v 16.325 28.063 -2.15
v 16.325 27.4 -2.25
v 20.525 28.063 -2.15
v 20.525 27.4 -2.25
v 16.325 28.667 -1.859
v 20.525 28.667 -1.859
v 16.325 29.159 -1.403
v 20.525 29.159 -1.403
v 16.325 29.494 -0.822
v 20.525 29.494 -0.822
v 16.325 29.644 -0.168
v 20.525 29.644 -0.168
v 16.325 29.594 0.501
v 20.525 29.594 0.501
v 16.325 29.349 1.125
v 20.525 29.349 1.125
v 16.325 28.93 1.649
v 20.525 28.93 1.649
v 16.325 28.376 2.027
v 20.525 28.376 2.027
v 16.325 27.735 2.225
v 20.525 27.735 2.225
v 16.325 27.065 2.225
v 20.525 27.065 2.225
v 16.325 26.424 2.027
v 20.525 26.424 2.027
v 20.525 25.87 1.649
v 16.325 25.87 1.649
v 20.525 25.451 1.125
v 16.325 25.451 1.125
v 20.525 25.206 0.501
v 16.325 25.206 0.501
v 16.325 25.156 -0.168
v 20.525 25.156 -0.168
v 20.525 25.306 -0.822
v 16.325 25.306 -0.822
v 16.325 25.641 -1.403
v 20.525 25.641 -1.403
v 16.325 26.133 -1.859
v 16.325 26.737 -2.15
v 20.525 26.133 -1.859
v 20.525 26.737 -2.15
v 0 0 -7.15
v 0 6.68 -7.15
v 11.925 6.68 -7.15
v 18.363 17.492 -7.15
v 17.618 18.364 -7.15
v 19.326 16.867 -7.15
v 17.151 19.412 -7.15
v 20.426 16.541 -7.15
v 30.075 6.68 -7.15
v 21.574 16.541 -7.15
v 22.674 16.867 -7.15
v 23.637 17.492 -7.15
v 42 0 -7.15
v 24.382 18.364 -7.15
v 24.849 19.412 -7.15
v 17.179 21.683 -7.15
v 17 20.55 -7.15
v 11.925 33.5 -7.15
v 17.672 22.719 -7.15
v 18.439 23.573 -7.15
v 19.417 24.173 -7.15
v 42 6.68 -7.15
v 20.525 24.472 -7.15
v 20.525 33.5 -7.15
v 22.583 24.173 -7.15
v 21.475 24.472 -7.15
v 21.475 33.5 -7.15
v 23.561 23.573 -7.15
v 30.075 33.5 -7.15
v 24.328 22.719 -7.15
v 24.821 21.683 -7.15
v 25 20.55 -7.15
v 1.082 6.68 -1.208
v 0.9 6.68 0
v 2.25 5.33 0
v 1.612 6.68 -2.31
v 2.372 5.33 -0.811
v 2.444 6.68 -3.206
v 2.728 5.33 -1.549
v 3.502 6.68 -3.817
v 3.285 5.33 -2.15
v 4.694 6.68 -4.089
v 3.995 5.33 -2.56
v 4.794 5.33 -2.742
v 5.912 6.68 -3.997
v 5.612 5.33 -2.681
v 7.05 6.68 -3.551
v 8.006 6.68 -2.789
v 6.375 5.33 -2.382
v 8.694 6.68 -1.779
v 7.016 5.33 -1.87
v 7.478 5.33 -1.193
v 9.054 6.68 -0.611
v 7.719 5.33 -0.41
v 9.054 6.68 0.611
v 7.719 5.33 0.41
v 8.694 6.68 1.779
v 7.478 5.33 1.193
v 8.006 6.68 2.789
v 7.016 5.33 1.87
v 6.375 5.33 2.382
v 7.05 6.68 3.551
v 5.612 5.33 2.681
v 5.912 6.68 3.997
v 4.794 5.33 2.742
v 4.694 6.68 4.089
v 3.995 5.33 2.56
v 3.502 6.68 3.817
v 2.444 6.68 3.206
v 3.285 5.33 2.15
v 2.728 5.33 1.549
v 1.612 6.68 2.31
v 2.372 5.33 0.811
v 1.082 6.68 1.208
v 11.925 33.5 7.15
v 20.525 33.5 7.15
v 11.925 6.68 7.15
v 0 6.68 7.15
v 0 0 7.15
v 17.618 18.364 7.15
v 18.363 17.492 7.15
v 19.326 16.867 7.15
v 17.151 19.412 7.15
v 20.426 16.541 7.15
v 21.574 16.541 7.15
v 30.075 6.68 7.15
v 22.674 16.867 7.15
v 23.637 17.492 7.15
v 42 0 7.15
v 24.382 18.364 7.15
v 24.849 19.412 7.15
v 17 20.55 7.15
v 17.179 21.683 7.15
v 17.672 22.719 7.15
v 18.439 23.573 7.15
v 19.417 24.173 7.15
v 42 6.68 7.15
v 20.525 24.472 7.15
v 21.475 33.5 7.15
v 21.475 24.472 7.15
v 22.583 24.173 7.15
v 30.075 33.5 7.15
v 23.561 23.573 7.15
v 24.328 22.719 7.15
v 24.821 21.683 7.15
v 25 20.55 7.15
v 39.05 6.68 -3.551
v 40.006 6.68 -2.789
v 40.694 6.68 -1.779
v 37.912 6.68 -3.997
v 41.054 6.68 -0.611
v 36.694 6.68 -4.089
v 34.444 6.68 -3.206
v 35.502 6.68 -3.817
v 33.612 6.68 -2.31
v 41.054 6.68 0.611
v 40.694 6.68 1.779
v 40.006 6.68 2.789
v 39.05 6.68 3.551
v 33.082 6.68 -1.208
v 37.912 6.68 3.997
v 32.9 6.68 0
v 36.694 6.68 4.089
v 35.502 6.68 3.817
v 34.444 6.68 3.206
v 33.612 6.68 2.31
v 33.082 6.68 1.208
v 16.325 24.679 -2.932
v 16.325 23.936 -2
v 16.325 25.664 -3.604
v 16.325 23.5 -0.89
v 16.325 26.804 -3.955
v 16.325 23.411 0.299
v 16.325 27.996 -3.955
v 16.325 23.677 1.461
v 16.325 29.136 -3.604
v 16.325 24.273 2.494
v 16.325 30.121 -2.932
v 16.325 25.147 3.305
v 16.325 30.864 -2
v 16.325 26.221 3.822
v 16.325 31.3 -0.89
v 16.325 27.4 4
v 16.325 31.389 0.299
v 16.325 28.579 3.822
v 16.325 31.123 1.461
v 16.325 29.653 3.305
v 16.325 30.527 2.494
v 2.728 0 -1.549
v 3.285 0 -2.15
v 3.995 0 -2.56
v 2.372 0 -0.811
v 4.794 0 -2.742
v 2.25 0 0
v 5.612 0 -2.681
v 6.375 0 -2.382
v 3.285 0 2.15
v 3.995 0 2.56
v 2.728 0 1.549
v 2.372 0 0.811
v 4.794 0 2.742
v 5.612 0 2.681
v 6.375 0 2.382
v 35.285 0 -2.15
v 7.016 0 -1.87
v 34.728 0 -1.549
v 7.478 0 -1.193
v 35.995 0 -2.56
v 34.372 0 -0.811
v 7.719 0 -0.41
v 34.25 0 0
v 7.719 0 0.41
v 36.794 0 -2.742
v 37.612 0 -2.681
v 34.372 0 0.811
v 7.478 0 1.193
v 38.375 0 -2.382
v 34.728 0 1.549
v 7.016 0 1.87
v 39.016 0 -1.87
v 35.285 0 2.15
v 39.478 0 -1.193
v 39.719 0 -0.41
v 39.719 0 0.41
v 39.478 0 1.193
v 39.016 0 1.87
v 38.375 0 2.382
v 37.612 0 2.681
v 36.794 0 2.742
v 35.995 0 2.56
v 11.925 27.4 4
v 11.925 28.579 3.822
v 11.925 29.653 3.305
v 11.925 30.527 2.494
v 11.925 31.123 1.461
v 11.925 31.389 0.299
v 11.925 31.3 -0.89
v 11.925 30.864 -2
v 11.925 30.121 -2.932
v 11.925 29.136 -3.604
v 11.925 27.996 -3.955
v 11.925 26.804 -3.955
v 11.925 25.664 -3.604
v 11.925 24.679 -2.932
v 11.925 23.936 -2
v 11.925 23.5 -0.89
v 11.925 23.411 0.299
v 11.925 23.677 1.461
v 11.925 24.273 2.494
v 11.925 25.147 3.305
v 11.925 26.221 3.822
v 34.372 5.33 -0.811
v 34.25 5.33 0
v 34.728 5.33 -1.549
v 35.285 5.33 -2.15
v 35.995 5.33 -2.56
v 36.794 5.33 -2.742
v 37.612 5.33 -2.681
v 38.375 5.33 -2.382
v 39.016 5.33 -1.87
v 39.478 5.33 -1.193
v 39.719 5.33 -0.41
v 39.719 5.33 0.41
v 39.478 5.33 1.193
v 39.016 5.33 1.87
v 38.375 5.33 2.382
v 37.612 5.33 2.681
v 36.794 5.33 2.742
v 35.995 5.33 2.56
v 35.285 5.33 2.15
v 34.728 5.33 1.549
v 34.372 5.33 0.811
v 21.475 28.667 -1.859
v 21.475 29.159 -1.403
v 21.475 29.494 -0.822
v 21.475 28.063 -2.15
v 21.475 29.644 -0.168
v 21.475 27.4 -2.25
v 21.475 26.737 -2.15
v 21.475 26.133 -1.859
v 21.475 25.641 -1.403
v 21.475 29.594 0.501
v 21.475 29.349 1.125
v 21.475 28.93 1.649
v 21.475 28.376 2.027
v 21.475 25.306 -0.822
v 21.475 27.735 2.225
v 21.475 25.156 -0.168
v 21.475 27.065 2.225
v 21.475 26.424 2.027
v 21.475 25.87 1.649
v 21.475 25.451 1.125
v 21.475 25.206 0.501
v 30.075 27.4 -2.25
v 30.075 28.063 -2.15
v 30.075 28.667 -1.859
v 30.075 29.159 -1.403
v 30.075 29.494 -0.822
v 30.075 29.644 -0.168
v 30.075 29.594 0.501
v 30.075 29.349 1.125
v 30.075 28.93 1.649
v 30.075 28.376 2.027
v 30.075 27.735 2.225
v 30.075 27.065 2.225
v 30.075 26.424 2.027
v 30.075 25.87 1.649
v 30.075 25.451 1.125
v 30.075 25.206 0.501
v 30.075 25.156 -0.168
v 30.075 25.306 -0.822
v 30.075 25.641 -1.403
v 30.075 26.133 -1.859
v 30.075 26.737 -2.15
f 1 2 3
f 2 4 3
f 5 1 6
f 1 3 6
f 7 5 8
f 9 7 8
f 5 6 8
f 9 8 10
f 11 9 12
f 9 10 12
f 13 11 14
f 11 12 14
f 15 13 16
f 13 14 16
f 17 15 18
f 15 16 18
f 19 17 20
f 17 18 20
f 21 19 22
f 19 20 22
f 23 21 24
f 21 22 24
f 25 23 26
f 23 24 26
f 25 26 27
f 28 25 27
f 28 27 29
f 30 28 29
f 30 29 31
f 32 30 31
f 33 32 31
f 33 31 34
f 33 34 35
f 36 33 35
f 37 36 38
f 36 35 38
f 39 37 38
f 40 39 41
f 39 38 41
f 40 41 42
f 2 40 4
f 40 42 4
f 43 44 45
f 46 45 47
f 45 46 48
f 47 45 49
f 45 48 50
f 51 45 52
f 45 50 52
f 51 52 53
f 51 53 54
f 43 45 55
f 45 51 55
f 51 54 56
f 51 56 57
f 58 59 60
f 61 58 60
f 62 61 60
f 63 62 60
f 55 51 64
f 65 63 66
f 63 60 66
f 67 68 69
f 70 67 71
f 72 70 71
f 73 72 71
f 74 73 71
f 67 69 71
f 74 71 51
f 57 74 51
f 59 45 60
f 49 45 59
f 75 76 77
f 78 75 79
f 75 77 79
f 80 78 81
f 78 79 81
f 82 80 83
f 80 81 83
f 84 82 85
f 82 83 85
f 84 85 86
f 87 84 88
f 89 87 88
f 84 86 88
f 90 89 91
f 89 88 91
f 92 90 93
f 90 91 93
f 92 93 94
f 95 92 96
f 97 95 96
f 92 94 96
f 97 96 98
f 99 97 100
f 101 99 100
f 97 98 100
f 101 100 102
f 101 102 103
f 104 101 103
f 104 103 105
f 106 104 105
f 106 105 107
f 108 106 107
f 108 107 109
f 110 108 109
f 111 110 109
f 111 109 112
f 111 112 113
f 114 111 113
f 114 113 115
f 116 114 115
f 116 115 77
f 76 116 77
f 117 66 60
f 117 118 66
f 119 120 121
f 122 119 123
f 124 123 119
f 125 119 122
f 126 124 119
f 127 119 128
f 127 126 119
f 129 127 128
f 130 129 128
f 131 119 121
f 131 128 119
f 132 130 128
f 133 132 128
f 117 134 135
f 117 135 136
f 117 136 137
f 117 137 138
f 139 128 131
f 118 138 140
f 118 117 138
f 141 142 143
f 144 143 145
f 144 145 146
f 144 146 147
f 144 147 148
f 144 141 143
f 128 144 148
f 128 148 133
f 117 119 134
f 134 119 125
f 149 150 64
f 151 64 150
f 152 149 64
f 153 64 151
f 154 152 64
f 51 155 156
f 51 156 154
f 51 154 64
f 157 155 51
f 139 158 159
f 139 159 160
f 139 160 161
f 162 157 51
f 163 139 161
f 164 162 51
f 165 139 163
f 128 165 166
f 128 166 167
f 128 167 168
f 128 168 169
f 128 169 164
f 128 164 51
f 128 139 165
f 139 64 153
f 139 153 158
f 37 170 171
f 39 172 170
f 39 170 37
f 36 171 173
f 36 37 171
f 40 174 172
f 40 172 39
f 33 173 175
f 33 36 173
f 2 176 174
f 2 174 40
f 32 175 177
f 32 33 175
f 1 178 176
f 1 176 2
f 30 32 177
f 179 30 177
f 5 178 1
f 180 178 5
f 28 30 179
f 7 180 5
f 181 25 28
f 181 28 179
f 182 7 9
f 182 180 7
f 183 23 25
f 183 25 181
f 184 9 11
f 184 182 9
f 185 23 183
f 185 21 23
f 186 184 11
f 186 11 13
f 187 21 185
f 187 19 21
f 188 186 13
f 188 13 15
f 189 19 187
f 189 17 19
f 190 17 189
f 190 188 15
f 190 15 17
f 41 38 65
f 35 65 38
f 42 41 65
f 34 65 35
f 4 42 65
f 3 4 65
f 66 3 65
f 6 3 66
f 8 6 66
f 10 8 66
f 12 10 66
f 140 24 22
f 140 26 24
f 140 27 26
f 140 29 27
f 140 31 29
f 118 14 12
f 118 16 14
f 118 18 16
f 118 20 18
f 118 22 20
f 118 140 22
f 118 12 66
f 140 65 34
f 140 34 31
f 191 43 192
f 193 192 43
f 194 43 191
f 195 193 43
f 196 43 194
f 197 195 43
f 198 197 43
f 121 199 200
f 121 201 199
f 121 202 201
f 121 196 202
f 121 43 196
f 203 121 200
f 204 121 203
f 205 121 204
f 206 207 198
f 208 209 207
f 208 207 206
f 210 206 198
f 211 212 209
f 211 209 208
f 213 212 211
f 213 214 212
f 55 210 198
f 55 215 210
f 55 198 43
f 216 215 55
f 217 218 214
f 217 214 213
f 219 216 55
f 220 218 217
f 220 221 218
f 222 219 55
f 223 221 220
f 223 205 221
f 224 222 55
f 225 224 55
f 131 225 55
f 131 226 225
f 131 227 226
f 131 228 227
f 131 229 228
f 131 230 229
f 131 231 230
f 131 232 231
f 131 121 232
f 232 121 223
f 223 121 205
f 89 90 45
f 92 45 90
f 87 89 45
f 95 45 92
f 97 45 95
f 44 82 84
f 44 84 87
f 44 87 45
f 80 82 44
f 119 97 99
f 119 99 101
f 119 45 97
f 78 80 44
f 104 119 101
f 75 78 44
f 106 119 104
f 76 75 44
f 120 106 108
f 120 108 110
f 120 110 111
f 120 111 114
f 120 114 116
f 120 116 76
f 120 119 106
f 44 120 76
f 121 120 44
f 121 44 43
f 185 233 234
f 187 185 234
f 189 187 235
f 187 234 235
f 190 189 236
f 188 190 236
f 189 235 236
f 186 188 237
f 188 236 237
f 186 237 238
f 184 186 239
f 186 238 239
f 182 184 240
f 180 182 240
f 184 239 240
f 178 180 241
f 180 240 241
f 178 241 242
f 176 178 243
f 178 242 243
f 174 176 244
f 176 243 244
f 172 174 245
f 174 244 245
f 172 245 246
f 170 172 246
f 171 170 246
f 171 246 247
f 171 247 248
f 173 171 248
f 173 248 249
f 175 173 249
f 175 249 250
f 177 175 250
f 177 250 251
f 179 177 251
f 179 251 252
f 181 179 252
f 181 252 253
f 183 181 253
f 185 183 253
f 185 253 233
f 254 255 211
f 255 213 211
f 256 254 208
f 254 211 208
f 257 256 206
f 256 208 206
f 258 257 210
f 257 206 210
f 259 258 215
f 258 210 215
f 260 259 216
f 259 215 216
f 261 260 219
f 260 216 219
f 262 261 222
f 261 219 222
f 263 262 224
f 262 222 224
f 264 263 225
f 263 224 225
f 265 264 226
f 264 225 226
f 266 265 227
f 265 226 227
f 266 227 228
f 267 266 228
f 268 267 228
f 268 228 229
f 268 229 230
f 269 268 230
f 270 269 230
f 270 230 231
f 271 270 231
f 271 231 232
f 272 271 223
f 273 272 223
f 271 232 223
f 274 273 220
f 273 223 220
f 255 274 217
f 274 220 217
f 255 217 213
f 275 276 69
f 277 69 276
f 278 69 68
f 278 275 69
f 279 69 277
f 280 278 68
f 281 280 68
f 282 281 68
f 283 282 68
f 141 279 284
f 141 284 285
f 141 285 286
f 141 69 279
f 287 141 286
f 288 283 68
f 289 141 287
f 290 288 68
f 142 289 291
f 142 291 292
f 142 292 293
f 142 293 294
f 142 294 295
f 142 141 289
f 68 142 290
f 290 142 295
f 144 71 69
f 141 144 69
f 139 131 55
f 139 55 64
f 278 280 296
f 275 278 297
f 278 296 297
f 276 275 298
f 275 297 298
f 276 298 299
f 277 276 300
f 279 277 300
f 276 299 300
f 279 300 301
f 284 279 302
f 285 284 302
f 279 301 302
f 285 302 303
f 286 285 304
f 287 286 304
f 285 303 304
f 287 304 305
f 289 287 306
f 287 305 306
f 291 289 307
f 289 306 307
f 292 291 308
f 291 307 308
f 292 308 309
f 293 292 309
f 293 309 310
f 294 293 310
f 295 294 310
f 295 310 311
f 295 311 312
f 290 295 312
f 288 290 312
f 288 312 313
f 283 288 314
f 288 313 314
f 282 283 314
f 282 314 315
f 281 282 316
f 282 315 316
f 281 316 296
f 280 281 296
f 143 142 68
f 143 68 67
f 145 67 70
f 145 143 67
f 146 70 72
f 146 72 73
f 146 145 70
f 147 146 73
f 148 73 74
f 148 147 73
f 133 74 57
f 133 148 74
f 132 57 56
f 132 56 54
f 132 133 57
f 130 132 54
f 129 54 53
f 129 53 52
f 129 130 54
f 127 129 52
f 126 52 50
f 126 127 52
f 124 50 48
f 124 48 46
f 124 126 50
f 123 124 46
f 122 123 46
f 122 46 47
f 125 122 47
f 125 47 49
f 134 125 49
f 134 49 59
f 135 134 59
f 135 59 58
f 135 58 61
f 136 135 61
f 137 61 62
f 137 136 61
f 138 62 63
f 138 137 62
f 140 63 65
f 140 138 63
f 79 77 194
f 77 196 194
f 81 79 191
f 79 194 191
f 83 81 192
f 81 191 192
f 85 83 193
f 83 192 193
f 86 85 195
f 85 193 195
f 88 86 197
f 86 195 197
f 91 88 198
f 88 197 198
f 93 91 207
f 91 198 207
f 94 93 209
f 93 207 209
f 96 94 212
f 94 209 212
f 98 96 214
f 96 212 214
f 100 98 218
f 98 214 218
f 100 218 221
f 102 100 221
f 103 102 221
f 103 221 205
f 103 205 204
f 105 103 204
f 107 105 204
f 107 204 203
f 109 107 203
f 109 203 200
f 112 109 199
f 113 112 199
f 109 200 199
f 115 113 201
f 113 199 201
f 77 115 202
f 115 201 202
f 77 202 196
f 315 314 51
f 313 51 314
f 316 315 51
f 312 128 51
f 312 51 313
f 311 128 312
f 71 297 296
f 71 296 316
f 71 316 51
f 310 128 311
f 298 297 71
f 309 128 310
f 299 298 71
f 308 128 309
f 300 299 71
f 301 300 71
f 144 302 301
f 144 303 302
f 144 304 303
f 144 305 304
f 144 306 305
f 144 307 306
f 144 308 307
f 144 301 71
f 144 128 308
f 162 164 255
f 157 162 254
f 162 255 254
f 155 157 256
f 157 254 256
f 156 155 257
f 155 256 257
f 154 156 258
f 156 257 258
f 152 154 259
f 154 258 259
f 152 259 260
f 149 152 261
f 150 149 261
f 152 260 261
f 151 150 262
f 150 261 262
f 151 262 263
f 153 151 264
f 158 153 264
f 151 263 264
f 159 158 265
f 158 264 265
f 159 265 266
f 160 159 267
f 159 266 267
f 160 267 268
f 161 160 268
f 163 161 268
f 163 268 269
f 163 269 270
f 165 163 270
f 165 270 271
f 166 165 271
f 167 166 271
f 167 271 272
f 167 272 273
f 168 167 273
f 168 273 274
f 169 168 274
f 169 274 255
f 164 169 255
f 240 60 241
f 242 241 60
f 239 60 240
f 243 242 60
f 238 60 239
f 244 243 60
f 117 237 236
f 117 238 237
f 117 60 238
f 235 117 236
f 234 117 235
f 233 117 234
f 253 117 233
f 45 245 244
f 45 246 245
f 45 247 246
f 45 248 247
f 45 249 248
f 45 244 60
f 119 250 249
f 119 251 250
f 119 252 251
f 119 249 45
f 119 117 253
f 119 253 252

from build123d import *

# Parameters (mm, degrees)
BOSS_EXTRUDE1_DEPTH                                  = 7.15
CBORE_FOR_M4_HEX_SOCKET_HEAD_CAP_SCREW1_D            = 4.5
CBORE_FOR_M4_HEX_SOCKET_HEAD_CAP_SCREW1_CBORE_D      = 8
CBORE_FOR_M4_HEX_SOCKET_HEAD_CAP_SCREW1_CBORE_DEPTH  = 4.4
CSK_FOR_M5_HEX_SOCKET_COUNTERSUNK_CAP_SC_D           = 5.5
CSK_FOR_M5_HEX_SOCKET_COUNTERSUNK_CAP_SC_CSINK_D     = 8.2
CSK_FOR_M5_HEX_SOCKET_COUNTERSUNK_CAP_SC_CSINK_ANGLE = 90


with BuildPart() as part:
    # Sketch2 → Boss-Extrude1 (new, symmetric)
    with BuildSketch(Plane.XY):
        with BuildLine():
            Line((11.925, 6.68), (0, 6.68))
            Line((0, 6.68), (0, 0))
            Line((0, 0), (42, 0))
            Line((42, 0), (42, 6.68))
            Line((42, 6.68), (30.075, 6.68))
            Line((30.075, 6.68), (30.075, 33.5))
            Line((30.075, 33.5), (21.475, 33.5))
            Line((21.475, 33.5), (21.475, 24.471696741))
            ThreePointArc((21.475, 24.471696741), (21, 16.5), (20.525, 24.471696741))
            Line((20.525, 24.471696741), (20.525, 33.5))
            Line((20.525, 33.5), (11.925, 33.5))
            Line((11.925, 33.5), (11.925, 6.68))
        make_face()
    extrude(amount=BOSS_EXTRUDE1_DEPTH, both=True)

    # CBORE for M4 Hex Socket Head Cap Screw1 (through all)
    with Locations(Plane.ZY.offset(-11.925)):
        with Locations((0, 27.4)):
            CounterBoreHole(CBORE_FOR_M4_HEX_SOCKET_HEAD_CAP_SCREW1_D / 2, CBORE_FOR_M4_HEX_SOCKET_HEAD_CAP_SCREW1_CBORE_D / 2, CBORE_FOR_M4_HEX_SOCKET_HEAD_CAP_SCREW1_CBORE_DEPTH)

    # CSK for M5 Hex Socket Countersunk Cap Screw1 (through all)
    with Locations(Plane(origin=(0, 6.68, 0), x_dir=(1, 0, 0), z_dir=(0, 1, 0))):
        with Locations((5, 0), (37, 0)):
            CounterSinkHole(CSK_FOR_M5_HEX_SOCKET_COUNTERSUNK_CAP_SC_D / 2, CSK_FOR_M5_HEX_SOCKET_COUNTERSUNK_CAP_SC_CSINK_D / 2, counter_sink_angle=CSK_FOR_M5_HEX_SOCKET_COUNTERSUNK_CAP_SC_CSINK_ANGLE)


solid = part.part
